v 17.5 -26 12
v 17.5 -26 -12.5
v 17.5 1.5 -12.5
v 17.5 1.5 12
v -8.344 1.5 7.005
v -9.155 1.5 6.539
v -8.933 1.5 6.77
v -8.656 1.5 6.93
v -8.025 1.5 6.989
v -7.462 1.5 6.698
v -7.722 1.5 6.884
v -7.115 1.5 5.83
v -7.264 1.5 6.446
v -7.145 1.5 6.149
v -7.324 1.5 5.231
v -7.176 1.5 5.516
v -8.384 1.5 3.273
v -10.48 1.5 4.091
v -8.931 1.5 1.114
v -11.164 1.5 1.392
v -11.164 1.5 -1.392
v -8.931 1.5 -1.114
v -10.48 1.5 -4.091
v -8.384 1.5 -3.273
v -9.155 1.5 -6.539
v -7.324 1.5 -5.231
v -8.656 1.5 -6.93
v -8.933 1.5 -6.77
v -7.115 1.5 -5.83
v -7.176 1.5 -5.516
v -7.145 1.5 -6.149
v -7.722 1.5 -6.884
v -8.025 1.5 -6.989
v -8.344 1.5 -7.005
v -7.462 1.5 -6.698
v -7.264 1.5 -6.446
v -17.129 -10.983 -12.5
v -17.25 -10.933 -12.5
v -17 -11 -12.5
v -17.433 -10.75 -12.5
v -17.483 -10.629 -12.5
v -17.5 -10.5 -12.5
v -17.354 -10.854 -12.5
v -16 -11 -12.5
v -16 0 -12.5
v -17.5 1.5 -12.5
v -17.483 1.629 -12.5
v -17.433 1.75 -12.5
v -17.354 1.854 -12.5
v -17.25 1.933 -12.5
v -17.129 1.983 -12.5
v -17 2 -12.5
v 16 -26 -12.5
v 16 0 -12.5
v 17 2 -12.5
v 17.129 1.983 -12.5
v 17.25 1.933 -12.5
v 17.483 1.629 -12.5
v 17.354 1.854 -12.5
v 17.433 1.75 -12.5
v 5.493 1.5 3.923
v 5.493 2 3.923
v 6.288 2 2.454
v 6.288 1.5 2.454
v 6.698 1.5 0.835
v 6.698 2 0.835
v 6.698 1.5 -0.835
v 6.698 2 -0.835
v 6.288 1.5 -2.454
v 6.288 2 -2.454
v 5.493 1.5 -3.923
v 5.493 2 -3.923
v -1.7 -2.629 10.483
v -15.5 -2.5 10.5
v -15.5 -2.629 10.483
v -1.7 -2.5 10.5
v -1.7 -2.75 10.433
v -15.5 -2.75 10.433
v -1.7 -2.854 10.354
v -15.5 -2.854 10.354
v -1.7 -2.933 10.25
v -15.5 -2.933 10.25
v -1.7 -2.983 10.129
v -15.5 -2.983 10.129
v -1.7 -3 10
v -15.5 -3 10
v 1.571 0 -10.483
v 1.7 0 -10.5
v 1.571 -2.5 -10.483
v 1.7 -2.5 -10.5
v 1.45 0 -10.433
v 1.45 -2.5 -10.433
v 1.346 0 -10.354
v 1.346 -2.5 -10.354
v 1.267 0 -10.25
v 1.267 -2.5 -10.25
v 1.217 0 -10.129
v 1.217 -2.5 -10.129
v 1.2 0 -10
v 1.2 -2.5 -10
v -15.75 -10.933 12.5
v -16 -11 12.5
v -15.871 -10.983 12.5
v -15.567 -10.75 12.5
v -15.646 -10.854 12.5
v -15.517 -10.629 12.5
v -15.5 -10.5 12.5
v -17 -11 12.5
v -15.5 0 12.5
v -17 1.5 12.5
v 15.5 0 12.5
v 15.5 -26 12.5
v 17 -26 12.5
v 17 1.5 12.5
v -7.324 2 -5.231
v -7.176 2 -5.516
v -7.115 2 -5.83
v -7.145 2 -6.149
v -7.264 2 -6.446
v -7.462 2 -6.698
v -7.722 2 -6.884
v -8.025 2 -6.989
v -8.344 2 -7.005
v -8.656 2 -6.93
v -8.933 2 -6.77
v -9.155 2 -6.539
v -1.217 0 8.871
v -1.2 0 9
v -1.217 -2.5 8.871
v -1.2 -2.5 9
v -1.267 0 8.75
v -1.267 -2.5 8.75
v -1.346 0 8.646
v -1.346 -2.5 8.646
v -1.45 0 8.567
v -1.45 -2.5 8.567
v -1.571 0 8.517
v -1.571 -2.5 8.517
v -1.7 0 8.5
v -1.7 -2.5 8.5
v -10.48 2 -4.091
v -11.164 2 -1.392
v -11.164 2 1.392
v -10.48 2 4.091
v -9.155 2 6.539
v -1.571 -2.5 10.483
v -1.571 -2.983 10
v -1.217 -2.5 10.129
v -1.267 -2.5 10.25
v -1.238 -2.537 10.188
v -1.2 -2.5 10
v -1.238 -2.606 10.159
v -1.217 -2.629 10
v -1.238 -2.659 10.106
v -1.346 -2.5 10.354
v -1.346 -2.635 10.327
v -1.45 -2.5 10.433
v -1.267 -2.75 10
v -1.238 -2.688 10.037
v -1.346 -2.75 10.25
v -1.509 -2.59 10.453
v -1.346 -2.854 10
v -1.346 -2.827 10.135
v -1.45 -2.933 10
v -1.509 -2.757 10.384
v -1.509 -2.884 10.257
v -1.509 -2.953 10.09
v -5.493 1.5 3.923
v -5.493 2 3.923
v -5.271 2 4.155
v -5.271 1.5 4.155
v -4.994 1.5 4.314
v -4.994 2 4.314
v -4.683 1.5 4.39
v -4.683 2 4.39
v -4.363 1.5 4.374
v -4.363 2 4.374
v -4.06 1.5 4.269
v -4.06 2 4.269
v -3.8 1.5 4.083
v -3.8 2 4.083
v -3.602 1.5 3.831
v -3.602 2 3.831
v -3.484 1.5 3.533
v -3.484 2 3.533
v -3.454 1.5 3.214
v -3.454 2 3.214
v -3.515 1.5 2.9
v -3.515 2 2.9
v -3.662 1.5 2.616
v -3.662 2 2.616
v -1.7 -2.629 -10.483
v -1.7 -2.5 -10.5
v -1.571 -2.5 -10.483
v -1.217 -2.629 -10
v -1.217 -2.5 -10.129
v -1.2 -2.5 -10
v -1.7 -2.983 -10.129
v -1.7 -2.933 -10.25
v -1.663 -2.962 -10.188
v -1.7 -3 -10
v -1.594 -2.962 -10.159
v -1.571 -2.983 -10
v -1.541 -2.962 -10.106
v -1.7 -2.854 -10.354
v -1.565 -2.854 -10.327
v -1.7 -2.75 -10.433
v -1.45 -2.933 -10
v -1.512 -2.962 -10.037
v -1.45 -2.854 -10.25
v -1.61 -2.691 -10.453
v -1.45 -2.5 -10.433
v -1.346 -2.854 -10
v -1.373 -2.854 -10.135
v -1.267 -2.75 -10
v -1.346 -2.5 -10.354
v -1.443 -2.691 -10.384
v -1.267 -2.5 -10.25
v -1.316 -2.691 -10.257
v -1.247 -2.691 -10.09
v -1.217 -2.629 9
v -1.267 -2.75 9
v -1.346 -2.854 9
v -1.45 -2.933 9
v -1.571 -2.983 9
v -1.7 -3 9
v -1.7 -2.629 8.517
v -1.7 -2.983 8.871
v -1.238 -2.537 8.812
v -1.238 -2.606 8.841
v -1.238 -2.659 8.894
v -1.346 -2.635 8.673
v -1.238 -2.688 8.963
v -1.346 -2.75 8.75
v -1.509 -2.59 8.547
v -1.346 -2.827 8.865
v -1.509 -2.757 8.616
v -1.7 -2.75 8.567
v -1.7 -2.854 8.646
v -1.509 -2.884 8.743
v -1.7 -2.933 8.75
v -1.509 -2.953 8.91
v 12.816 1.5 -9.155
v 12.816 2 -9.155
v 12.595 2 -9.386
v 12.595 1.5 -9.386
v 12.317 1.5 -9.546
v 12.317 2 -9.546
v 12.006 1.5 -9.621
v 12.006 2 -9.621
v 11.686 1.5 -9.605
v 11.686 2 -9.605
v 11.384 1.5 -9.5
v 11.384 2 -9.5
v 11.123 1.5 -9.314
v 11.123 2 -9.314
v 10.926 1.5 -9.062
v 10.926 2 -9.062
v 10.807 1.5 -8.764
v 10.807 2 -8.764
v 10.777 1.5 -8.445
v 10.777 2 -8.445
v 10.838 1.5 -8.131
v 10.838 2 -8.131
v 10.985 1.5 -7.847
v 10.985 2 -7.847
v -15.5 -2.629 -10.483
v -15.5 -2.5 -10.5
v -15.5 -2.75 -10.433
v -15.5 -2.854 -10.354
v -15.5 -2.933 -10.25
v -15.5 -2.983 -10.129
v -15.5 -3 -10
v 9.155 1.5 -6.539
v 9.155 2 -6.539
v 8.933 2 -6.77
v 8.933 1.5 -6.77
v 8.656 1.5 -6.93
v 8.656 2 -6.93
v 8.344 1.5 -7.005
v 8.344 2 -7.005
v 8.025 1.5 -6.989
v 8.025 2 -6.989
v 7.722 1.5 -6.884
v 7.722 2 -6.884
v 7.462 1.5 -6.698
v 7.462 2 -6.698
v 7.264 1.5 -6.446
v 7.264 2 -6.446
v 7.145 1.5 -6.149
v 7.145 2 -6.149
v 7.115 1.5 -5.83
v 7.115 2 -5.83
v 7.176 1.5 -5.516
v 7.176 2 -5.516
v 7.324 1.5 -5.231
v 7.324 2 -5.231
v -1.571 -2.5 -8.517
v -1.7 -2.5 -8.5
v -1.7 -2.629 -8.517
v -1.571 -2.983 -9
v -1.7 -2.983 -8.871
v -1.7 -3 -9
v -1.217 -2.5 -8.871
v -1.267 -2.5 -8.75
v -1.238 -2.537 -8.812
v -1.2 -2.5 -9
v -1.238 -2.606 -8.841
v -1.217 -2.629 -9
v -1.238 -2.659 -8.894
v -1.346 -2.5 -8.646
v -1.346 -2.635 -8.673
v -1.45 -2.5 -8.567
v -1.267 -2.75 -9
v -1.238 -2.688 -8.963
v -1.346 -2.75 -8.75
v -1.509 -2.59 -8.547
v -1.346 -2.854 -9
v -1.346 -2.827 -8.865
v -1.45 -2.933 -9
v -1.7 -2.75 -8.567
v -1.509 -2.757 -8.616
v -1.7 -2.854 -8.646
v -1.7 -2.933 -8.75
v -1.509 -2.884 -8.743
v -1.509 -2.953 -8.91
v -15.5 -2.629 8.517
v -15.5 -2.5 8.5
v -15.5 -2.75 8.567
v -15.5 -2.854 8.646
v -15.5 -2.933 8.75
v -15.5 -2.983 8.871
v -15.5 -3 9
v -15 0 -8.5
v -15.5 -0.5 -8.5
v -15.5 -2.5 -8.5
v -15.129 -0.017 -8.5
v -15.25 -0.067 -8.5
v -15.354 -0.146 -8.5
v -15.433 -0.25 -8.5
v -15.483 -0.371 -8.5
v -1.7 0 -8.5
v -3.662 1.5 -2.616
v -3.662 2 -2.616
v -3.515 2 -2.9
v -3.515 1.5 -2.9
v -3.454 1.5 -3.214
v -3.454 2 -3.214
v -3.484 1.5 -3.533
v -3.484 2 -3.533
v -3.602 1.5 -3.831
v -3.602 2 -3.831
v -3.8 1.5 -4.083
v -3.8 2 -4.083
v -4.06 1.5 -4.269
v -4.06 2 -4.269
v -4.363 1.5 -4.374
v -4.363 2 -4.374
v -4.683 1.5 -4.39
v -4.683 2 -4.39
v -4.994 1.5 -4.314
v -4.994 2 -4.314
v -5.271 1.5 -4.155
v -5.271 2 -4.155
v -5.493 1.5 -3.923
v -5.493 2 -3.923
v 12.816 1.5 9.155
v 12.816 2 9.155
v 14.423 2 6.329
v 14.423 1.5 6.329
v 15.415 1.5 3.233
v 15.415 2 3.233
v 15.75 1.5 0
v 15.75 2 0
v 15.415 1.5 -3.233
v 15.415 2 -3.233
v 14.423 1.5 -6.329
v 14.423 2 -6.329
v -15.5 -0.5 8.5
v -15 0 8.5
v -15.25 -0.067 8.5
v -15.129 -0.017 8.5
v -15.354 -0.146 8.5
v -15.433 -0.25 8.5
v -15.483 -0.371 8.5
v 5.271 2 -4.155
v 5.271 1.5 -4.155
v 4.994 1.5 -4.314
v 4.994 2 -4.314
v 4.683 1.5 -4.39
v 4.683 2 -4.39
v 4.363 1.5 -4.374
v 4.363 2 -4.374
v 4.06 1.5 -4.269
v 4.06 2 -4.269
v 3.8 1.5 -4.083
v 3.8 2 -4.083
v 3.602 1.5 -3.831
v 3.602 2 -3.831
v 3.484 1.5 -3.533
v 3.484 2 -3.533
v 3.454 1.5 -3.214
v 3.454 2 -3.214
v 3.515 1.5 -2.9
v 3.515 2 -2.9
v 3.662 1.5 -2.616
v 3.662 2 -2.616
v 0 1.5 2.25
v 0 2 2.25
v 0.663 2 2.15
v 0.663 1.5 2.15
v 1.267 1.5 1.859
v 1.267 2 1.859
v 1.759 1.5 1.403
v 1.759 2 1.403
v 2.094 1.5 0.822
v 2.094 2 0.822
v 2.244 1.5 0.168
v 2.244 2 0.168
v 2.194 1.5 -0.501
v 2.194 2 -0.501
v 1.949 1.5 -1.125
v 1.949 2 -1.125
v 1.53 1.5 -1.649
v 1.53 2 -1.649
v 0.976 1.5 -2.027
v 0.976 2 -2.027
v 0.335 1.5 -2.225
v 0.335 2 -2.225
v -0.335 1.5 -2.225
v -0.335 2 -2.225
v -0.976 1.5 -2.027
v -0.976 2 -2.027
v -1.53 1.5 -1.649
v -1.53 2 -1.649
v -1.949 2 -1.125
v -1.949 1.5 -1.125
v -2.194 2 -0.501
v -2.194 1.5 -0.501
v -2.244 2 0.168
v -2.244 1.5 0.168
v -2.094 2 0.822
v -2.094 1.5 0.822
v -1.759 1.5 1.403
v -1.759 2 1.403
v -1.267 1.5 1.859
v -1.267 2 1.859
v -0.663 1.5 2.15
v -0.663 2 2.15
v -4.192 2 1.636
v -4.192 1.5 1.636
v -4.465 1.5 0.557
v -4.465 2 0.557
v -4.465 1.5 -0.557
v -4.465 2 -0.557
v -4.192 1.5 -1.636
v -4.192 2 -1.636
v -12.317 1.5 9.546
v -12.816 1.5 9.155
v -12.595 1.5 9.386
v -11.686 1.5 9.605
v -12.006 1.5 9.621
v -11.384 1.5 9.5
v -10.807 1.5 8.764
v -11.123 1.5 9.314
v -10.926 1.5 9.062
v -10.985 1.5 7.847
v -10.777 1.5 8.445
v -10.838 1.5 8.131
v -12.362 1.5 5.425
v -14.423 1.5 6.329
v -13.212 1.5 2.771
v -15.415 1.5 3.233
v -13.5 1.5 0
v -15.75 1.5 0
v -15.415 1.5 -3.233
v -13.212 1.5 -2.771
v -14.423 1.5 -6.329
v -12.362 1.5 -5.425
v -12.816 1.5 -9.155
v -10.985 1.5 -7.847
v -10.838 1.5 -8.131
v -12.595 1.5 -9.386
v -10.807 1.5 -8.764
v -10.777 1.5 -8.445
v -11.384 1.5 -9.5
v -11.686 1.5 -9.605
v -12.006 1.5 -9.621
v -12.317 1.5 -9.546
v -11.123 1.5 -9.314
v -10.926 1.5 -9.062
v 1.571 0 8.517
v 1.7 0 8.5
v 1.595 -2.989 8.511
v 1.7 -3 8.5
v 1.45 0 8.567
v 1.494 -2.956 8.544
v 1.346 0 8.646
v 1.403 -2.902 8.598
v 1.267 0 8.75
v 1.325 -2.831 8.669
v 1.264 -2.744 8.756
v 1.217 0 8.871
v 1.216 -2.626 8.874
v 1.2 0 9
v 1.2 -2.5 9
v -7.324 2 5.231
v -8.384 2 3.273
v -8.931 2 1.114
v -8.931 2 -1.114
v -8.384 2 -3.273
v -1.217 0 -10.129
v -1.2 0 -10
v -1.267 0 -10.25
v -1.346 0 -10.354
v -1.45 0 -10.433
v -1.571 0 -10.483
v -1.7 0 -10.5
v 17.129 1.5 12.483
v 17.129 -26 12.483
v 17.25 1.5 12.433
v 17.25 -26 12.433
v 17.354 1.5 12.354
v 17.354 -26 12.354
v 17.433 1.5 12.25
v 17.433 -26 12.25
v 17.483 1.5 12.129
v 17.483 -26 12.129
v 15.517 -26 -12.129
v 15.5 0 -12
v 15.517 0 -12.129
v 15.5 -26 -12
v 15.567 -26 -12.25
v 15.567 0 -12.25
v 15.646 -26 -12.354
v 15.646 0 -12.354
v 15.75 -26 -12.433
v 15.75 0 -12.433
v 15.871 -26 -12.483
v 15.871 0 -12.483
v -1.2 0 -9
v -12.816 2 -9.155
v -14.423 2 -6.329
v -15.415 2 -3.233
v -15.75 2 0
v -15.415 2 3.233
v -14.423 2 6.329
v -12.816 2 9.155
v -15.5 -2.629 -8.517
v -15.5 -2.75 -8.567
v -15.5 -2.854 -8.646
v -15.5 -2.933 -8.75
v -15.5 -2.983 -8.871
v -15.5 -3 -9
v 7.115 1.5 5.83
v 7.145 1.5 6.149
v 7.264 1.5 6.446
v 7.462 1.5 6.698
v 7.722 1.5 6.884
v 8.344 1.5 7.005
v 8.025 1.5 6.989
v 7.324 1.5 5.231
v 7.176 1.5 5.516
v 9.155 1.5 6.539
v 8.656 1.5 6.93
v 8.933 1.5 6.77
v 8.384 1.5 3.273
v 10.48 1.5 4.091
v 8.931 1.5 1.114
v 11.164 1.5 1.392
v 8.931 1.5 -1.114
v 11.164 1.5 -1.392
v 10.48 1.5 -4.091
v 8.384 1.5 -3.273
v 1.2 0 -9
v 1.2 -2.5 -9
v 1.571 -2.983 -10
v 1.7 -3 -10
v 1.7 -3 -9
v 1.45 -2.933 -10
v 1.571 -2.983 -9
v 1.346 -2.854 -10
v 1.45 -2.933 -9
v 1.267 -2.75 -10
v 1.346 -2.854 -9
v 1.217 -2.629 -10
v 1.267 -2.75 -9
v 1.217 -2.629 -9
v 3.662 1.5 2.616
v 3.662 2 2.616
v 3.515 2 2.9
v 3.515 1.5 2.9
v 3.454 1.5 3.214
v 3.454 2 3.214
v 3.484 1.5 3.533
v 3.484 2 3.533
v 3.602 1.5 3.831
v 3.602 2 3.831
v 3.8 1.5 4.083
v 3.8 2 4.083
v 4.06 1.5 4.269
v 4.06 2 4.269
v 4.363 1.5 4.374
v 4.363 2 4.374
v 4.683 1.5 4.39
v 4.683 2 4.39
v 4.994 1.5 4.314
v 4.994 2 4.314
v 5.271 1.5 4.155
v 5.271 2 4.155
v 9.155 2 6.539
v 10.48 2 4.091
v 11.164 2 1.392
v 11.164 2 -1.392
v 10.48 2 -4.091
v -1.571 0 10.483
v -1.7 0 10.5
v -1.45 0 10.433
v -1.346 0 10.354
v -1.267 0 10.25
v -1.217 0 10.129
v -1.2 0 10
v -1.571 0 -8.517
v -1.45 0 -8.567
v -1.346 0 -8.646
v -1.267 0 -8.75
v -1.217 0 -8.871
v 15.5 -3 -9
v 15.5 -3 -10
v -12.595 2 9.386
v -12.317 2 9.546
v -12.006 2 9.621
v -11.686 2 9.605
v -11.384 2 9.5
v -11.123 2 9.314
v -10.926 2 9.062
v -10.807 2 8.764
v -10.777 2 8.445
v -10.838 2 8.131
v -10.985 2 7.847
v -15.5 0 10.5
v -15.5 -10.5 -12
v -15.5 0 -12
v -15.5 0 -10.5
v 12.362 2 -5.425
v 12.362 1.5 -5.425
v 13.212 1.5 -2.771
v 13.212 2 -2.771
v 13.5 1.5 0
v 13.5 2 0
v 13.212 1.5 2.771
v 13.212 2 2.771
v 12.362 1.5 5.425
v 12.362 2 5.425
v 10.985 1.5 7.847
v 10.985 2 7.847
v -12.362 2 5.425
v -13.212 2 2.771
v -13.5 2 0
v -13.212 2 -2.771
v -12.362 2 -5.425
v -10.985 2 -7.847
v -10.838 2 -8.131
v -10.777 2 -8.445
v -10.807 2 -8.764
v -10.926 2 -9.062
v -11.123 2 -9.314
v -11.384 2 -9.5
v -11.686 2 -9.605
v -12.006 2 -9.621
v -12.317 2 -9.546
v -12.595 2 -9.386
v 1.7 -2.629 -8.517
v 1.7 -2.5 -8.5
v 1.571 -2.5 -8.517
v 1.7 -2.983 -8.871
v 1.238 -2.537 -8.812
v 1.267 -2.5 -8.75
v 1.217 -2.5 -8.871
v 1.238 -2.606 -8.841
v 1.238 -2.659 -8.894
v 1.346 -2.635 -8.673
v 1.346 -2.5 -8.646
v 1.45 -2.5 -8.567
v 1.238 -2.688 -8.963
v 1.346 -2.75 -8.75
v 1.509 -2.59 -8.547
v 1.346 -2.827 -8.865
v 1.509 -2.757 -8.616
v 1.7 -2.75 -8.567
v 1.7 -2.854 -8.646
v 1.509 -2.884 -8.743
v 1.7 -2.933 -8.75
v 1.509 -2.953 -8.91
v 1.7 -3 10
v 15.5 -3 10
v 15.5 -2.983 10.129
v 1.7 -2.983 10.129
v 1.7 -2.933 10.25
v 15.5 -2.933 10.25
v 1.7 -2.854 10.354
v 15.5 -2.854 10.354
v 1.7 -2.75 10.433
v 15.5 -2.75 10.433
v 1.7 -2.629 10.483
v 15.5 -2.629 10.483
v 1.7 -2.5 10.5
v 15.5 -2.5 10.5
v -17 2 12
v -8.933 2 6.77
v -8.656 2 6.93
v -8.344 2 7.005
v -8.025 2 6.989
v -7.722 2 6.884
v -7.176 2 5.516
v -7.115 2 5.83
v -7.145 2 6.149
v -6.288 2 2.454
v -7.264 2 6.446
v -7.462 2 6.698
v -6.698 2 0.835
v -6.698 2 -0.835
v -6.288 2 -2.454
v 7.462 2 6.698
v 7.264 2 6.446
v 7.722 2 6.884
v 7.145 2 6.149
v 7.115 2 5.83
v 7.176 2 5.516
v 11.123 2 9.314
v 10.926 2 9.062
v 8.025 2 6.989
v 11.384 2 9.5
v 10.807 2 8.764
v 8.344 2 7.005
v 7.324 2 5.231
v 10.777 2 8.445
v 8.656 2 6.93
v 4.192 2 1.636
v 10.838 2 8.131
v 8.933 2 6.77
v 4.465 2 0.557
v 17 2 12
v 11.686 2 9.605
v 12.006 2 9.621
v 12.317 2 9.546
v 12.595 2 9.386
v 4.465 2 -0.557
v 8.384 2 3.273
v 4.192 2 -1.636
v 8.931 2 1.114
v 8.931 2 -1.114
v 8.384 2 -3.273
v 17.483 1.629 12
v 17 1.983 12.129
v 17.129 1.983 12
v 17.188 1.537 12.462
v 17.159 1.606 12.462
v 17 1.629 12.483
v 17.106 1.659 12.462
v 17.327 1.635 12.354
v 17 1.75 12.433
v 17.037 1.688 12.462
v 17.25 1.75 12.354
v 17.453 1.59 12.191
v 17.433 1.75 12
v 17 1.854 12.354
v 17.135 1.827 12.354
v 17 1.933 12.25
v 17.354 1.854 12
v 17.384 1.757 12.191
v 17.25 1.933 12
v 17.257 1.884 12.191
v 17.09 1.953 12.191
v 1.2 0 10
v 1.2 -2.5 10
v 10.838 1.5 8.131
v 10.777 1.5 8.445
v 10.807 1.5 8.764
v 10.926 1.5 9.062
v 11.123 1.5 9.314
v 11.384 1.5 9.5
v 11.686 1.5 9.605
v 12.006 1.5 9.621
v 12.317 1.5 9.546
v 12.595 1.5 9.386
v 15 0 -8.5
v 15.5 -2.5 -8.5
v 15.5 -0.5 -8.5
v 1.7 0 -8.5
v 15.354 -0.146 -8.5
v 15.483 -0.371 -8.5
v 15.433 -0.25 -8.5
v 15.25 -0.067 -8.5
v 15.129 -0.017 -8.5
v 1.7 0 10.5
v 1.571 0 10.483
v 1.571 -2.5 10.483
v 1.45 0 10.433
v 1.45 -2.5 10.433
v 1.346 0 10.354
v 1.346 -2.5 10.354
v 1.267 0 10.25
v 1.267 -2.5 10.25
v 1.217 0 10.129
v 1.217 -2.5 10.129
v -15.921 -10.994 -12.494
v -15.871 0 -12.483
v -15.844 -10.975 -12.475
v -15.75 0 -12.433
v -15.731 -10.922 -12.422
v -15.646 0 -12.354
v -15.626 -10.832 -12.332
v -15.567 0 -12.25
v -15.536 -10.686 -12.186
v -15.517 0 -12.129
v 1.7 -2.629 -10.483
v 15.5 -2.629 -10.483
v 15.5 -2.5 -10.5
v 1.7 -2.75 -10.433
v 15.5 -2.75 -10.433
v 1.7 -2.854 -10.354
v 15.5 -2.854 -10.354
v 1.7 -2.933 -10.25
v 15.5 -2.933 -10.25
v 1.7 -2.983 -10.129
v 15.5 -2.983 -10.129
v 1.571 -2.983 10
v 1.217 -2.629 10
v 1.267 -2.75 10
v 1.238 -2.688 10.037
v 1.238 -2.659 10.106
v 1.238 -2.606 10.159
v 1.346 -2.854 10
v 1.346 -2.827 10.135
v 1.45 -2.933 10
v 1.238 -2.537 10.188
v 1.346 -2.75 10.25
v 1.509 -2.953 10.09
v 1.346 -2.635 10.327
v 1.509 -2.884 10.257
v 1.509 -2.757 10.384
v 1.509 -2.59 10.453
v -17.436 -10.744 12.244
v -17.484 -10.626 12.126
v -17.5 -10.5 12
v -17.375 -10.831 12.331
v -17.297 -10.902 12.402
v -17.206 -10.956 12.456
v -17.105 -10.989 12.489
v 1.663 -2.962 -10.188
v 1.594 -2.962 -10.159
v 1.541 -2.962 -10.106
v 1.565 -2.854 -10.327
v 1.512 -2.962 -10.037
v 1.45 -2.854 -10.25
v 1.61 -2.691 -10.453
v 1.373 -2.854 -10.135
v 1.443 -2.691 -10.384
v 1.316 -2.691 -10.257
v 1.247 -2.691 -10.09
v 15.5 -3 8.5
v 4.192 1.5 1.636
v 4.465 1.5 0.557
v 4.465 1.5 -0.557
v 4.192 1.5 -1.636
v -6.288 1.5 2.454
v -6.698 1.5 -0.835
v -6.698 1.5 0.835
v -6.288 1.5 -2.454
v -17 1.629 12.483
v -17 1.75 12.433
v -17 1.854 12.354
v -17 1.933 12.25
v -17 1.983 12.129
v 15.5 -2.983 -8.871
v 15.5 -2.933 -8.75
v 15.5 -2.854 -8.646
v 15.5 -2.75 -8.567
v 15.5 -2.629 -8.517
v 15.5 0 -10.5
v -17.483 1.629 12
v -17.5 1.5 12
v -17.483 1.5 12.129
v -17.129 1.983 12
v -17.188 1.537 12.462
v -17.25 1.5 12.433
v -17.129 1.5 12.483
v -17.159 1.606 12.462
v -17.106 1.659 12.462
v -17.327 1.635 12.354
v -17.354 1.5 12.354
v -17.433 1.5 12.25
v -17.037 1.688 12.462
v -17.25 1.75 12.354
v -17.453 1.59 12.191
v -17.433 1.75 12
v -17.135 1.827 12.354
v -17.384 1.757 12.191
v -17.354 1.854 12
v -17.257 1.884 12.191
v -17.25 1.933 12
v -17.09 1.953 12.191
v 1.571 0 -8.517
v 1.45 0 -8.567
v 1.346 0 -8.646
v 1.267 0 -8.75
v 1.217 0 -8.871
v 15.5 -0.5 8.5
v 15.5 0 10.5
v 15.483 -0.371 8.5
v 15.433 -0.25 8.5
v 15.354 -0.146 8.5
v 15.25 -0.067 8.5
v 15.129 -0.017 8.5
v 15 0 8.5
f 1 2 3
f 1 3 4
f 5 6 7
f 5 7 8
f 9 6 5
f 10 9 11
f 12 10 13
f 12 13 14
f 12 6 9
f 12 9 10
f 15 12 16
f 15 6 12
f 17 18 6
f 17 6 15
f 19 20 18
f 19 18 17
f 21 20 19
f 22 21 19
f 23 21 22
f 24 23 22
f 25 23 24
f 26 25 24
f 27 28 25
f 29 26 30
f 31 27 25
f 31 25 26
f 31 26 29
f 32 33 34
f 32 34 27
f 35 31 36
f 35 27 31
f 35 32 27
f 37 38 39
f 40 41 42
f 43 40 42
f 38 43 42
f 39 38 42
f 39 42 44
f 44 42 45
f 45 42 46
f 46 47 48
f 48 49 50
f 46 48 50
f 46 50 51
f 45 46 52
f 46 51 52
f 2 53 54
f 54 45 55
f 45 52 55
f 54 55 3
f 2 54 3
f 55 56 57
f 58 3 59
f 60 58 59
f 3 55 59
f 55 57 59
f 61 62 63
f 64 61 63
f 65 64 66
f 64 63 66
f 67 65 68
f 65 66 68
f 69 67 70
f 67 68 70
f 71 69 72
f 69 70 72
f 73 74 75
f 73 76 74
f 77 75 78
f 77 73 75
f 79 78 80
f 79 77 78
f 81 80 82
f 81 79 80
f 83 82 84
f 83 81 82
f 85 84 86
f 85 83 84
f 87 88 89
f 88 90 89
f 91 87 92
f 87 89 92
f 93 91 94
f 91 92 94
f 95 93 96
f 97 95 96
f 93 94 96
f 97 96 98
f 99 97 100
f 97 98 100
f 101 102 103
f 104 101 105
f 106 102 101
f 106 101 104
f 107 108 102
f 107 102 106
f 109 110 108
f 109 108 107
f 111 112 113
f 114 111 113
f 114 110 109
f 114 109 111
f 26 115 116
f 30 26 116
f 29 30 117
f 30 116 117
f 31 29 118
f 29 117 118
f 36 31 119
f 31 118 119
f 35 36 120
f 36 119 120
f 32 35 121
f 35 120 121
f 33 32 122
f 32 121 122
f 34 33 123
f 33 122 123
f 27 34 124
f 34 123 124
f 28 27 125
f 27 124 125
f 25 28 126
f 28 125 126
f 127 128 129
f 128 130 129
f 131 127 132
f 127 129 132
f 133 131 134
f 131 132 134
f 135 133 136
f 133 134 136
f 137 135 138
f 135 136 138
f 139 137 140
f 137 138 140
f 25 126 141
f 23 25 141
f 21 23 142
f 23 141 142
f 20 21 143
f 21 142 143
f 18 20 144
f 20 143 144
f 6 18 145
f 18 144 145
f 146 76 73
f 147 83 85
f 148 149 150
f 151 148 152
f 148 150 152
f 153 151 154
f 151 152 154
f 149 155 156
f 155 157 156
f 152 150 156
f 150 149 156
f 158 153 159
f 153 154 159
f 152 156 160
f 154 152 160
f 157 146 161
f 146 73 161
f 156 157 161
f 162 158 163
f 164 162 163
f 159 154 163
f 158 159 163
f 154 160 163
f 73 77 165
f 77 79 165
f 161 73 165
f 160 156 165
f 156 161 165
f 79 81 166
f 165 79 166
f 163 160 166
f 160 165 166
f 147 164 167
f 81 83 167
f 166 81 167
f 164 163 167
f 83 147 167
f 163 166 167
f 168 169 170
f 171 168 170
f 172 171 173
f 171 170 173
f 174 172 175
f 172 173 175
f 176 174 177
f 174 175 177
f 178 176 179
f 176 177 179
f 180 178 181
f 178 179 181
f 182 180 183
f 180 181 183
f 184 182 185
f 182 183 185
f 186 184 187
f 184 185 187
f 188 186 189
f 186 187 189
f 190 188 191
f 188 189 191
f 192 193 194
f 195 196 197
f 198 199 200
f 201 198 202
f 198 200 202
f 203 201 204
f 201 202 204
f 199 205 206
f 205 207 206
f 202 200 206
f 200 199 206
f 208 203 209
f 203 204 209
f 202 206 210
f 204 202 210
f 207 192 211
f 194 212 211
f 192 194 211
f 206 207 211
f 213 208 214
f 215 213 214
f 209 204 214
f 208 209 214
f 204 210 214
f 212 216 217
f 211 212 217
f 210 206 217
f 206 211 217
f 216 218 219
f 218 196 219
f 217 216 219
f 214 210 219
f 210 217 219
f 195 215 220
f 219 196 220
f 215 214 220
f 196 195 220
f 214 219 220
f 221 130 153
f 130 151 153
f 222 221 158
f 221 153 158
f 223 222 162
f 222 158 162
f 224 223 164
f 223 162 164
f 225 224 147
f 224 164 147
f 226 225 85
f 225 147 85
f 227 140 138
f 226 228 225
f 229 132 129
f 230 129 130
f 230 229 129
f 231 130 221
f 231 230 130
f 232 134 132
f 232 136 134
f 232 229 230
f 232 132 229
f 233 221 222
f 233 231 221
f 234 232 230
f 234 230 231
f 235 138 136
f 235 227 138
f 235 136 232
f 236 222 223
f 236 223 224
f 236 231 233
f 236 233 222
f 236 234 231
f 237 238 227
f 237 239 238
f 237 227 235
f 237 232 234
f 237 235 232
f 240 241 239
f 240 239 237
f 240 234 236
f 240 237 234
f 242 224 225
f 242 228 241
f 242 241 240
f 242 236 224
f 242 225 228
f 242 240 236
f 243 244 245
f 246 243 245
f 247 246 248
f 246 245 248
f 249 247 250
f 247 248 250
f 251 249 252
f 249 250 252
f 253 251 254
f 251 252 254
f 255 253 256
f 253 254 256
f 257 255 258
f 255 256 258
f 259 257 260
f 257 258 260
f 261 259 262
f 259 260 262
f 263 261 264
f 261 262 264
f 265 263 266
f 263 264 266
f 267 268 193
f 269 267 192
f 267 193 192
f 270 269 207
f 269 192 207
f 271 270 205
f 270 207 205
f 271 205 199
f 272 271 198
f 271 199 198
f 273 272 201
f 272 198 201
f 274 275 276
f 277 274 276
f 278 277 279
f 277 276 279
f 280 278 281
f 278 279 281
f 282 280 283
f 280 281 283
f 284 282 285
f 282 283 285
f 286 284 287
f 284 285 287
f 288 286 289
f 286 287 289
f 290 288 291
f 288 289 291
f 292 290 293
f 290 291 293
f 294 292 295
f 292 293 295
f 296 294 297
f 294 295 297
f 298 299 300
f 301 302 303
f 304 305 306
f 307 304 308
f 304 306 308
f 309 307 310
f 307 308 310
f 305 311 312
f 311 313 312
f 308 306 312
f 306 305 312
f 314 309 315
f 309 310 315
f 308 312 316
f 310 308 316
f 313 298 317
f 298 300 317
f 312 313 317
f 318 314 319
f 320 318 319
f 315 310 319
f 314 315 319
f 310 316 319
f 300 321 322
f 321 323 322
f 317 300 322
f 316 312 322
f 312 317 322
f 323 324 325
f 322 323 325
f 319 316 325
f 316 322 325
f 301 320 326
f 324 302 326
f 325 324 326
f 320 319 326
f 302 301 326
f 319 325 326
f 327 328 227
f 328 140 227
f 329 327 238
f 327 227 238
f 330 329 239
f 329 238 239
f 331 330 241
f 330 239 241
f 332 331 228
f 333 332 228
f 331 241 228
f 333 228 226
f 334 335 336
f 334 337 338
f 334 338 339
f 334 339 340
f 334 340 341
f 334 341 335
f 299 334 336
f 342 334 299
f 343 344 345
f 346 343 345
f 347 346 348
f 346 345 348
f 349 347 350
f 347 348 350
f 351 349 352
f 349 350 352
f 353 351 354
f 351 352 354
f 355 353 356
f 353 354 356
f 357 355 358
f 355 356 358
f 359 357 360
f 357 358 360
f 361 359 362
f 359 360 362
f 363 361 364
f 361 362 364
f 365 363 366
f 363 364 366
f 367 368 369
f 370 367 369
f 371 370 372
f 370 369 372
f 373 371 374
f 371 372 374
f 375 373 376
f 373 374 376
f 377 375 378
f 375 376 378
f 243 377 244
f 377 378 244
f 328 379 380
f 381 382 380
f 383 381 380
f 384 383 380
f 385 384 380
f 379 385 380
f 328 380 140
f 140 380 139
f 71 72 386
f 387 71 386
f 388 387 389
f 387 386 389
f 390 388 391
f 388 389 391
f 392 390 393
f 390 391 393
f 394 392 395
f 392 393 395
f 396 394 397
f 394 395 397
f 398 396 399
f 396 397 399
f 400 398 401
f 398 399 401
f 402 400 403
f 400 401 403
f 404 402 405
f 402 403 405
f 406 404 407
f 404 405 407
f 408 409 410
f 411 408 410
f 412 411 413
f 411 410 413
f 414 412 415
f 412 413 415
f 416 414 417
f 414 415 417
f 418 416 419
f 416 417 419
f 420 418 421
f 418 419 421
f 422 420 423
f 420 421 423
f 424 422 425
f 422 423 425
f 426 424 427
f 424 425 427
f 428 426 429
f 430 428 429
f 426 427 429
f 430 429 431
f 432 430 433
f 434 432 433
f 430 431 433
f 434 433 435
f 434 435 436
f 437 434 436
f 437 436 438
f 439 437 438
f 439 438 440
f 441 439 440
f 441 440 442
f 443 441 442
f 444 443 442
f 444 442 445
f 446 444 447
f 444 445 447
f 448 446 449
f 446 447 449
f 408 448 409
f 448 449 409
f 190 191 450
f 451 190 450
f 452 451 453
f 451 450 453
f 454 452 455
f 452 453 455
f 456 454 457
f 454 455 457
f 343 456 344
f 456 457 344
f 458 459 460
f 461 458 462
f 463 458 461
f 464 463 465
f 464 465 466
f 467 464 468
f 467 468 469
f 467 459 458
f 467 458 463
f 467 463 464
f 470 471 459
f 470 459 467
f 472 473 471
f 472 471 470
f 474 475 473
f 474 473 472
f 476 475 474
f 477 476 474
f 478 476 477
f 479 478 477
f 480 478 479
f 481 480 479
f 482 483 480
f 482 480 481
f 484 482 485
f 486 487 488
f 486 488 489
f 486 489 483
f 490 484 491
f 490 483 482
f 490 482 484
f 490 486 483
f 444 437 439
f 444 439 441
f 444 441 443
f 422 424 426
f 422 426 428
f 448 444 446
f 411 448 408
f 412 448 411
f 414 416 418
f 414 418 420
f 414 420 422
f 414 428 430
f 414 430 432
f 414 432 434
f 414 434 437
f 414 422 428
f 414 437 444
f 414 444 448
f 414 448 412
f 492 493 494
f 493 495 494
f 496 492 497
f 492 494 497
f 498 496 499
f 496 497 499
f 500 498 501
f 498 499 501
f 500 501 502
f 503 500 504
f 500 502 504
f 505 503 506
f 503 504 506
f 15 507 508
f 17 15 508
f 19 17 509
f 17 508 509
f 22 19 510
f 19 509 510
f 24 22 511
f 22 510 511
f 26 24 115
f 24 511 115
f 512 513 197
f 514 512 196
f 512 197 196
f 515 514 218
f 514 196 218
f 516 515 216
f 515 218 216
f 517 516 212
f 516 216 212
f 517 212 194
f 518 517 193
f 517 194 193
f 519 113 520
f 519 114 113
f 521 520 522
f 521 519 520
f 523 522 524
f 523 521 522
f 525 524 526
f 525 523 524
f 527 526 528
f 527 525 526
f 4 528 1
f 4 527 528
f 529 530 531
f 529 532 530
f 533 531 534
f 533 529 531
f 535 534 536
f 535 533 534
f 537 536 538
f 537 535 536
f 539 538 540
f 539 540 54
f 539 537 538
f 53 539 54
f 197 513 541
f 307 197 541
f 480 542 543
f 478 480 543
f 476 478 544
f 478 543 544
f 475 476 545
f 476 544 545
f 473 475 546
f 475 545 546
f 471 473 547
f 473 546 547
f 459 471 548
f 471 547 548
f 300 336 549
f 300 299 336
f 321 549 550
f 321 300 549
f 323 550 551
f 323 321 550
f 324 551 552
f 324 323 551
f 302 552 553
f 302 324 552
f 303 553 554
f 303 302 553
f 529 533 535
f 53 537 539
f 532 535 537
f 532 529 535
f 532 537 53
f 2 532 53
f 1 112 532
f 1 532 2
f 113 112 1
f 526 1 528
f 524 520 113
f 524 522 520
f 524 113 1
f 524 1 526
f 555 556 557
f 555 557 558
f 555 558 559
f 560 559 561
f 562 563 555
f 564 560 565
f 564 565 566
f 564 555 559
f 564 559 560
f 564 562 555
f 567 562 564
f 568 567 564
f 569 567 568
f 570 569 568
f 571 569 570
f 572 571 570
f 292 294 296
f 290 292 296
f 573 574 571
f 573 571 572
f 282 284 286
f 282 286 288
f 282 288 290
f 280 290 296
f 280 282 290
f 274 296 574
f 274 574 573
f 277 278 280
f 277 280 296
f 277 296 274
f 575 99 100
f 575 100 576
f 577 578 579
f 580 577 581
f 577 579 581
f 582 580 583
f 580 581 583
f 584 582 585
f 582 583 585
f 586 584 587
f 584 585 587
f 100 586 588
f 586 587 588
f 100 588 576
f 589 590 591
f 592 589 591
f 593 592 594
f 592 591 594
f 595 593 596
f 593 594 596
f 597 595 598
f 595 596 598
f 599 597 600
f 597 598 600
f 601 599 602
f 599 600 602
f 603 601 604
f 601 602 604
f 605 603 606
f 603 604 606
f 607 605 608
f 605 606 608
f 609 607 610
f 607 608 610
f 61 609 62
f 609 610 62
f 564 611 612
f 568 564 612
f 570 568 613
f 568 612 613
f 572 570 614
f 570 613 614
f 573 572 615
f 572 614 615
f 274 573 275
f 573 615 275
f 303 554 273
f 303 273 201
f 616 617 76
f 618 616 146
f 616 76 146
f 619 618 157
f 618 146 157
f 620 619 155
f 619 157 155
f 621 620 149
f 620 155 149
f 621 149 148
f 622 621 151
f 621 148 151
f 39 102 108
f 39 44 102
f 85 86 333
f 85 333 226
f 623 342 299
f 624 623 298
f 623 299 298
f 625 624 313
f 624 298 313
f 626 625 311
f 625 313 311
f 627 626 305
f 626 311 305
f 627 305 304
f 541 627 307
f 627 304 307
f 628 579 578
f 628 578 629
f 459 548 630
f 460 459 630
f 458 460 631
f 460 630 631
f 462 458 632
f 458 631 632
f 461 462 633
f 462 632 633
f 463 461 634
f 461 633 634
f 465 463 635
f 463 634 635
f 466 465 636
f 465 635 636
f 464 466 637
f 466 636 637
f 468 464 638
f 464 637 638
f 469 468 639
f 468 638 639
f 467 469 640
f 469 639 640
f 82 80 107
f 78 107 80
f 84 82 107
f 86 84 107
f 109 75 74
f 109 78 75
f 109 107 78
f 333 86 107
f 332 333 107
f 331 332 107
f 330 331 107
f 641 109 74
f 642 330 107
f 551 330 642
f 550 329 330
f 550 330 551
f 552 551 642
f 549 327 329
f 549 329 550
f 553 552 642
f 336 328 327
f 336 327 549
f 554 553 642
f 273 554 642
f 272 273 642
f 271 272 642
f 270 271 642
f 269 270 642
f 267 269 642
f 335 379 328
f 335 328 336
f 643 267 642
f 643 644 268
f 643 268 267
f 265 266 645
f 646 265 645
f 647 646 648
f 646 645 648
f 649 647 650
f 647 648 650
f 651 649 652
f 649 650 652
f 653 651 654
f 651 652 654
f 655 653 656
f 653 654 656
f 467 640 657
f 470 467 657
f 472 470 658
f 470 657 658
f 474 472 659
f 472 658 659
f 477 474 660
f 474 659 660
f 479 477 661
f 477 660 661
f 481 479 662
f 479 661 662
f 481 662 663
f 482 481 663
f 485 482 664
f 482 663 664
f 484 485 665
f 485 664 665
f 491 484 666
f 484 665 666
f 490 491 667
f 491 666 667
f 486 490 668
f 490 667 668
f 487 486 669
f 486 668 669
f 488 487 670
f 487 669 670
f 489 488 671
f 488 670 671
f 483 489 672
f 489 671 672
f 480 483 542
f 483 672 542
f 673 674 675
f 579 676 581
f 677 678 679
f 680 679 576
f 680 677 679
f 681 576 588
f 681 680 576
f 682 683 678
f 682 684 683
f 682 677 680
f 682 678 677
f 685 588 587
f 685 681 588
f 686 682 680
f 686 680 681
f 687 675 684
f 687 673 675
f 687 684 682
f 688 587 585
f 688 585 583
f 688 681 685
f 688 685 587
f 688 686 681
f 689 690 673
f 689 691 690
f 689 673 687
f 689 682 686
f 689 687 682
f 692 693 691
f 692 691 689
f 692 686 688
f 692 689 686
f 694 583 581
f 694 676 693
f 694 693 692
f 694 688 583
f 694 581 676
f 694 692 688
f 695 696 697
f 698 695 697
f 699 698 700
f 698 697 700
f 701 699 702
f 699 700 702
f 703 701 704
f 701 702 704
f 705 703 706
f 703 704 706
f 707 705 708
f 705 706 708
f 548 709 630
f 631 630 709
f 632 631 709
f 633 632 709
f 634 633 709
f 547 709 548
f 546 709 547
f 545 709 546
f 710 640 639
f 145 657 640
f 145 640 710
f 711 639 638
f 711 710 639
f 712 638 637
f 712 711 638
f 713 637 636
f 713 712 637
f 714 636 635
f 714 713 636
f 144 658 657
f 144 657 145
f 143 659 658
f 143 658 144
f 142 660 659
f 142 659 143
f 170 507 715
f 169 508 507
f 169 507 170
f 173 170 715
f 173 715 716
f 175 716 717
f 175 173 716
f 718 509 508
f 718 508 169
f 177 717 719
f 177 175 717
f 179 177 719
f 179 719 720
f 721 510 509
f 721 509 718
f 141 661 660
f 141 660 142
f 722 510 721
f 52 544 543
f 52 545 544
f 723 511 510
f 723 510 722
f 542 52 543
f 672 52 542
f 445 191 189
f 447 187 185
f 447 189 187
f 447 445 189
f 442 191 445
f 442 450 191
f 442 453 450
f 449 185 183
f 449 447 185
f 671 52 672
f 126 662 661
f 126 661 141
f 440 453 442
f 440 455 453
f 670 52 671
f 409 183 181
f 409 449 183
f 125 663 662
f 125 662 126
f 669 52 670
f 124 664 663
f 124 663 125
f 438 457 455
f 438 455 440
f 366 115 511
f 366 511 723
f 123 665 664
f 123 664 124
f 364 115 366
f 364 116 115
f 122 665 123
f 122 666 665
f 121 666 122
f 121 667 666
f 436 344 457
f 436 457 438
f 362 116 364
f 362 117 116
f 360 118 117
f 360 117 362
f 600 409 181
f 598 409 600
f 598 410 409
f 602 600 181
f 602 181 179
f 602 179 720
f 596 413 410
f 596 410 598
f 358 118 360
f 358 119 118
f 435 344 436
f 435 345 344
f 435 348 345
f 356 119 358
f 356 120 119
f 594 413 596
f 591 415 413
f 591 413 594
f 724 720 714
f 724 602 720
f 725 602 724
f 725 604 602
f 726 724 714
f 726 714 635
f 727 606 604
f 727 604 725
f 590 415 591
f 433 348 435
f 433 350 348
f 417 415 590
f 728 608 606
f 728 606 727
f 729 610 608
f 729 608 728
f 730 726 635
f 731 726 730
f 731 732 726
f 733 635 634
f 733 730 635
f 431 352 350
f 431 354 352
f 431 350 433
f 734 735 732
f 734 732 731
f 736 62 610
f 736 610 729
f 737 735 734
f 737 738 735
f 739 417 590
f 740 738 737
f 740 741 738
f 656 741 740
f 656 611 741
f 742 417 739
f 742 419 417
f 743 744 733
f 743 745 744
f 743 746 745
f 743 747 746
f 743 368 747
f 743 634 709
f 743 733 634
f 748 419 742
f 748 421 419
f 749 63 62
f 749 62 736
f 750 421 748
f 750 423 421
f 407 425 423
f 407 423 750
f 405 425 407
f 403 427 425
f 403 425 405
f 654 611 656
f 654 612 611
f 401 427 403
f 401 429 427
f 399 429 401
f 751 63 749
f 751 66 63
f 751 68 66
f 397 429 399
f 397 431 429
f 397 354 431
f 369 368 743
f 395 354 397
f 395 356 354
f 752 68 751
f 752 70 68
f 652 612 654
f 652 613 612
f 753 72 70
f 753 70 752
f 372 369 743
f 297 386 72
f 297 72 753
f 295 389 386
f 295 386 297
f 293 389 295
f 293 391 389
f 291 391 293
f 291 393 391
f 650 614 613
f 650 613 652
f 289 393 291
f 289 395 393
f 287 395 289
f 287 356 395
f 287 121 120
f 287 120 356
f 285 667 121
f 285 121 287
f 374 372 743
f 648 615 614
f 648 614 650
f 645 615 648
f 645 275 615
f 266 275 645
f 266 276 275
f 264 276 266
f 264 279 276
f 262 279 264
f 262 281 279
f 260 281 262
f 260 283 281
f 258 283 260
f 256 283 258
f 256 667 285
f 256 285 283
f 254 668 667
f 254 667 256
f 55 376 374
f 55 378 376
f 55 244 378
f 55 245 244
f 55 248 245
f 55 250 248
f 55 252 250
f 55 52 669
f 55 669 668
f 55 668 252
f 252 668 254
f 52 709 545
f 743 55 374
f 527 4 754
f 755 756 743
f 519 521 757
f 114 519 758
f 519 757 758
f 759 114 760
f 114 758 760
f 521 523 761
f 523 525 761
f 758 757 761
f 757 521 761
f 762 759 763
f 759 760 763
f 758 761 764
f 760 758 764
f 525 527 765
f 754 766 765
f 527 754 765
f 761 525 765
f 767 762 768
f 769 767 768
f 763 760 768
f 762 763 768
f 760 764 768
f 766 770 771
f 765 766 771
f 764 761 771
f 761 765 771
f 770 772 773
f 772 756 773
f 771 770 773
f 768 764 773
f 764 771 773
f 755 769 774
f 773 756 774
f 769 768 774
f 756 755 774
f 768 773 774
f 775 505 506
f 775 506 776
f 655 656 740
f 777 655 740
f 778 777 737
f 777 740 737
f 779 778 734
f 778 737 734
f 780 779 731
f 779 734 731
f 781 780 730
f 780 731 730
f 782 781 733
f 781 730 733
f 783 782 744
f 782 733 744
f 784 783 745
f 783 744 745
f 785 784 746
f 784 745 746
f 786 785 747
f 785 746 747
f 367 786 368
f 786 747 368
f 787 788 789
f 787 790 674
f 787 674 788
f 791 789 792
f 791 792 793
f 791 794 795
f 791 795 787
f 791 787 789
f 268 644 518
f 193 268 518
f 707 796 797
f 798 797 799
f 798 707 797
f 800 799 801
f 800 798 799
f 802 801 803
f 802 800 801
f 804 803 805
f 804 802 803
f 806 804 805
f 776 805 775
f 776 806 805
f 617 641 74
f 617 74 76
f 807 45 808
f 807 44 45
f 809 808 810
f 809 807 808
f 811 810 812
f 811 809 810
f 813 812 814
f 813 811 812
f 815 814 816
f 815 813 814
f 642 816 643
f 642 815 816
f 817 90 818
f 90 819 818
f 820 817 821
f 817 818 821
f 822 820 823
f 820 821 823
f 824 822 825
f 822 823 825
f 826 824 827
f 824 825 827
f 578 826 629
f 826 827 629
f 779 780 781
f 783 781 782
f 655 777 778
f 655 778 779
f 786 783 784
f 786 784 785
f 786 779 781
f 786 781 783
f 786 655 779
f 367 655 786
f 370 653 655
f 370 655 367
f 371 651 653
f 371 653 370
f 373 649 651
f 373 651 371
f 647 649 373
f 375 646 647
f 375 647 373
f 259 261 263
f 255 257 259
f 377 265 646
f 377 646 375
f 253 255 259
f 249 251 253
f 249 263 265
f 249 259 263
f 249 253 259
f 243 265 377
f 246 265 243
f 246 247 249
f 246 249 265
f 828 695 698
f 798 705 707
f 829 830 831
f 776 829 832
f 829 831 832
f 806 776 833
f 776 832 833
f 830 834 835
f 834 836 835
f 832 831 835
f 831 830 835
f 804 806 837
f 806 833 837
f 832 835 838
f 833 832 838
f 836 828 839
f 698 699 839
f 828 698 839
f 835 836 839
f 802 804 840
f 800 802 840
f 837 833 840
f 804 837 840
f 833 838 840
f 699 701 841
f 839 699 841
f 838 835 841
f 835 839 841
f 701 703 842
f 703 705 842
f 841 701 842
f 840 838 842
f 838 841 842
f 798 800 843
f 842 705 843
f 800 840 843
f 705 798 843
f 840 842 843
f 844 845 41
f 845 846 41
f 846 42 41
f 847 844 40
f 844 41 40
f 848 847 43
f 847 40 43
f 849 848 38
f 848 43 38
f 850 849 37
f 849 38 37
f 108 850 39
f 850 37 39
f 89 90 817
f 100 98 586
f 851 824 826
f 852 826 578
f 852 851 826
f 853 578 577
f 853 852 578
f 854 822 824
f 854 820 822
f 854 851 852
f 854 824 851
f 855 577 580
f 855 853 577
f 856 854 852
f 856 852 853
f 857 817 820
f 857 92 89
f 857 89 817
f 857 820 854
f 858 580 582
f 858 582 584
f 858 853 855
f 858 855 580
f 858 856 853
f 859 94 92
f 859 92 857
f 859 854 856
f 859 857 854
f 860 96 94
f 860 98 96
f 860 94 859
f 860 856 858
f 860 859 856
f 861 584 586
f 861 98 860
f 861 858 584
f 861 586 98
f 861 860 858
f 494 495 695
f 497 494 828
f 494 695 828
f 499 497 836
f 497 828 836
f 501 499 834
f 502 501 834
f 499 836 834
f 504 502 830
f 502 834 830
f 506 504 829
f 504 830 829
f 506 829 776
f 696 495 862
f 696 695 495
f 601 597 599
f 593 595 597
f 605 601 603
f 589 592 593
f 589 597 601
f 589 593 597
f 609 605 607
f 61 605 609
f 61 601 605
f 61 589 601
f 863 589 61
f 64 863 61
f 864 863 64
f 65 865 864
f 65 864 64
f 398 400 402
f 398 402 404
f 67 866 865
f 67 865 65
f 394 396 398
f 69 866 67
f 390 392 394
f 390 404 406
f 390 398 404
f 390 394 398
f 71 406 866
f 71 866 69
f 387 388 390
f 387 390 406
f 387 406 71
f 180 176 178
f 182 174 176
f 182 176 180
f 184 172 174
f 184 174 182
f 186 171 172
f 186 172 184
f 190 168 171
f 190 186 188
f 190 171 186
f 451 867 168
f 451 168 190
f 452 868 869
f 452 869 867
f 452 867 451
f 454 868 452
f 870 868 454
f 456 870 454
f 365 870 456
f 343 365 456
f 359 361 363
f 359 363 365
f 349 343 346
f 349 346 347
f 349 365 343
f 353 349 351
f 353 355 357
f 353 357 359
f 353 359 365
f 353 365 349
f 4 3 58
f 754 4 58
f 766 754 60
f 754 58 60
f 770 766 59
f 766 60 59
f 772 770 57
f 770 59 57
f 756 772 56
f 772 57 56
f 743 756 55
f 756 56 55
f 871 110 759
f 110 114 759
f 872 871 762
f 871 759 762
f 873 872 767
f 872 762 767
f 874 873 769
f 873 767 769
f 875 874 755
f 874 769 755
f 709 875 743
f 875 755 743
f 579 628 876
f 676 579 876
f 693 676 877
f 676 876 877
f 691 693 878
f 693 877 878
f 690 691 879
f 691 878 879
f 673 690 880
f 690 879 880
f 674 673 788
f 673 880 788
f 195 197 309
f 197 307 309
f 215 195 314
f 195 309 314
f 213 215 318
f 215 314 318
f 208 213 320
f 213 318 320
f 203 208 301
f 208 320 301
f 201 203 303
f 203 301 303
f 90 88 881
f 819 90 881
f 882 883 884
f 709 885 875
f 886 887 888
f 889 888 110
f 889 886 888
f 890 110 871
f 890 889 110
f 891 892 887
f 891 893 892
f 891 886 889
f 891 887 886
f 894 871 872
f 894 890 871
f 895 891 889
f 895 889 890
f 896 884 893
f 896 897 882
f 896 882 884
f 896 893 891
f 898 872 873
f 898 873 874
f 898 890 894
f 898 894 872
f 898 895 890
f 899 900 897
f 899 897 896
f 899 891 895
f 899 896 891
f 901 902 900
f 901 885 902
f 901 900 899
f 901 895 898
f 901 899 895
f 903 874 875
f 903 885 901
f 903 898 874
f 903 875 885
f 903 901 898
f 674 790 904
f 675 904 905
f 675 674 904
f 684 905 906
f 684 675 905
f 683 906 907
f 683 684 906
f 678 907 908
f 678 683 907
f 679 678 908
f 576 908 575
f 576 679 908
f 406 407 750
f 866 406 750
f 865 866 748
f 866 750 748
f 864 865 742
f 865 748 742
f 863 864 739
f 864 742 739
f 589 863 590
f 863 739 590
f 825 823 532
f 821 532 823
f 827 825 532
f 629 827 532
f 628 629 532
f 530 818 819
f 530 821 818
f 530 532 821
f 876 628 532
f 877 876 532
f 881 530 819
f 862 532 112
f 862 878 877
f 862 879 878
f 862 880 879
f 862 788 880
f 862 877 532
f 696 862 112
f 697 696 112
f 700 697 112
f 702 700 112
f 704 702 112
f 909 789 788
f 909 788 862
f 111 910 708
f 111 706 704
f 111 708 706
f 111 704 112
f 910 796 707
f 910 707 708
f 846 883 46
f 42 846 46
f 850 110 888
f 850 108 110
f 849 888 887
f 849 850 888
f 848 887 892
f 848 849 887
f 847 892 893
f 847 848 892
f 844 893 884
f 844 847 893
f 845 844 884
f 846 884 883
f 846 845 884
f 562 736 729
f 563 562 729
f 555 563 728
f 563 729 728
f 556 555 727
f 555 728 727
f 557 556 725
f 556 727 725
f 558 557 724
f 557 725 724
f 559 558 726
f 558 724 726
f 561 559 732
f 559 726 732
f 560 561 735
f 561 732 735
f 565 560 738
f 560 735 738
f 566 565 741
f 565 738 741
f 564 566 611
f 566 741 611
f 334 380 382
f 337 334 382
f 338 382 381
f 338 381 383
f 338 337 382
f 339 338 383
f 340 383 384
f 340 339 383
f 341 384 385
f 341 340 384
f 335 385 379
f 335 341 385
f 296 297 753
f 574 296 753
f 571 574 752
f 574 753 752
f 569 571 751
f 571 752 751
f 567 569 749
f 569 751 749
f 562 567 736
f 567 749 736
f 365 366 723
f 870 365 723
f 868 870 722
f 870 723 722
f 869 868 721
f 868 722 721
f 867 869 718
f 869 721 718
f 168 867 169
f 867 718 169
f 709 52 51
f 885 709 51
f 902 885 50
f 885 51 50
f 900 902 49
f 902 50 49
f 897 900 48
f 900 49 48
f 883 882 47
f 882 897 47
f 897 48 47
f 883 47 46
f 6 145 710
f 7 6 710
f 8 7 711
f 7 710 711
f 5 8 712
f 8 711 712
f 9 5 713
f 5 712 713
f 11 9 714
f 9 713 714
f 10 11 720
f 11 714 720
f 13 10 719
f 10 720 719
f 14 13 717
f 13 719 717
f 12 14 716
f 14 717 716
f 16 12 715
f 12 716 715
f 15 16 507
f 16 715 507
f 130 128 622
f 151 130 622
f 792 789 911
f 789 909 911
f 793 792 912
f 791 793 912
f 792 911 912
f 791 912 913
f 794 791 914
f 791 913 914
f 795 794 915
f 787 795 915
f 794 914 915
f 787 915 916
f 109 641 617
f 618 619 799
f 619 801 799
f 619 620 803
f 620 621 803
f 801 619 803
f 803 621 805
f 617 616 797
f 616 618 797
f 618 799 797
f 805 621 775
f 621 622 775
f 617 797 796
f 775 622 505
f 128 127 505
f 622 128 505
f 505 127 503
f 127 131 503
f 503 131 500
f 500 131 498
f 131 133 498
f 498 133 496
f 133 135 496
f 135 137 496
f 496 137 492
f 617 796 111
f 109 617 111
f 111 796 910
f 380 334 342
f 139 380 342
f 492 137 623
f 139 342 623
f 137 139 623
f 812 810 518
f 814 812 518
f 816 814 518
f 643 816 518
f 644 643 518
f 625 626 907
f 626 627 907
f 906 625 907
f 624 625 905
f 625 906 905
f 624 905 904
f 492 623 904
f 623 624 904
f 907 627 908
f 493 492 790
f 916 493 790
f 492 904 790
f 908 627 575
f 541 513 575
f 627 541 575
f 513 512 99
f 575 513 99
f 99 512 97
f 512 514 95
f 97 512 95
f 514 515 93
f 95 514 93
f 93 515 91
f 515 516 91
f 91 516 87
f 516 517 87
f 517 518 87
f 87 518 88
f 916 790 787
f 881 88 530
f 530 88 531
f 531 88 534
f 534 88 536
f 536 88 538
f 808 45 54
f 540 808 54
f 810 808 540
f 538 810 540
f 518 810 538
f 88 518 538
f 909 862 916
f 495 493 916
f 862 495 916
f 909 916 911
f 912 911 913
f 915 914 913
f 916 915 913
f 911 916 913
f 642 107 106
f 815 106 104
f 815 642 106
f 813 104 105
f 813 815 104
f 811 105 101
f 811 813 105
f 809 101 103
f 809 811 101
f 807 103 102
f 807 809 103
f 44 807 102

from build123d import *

# Parameters (mm, degrees)
SKETCH1_W           = 35
SKETCH1_H           = 25
BOSS_EXTRUDE1_DEPTH = 2
SKETCH3_W           = 2
SKETCH3_H           = 25
BOSS_EXTRUDE3_DEPTH = 11
SKETCH4_W           = 2
SKETCH4_H           = 25
BOSS_EXTRUDE4_DEPTH = 26
SKETCH5_W           = 14.3
SKETCH5_H           = 2
BOSS_EXTRUDE5_DEPTH = 3
SKETCH6_R           = 2.25
CUT_EXTRUDE1_DEPTH  = 0.5
FILLET1_R           = 0.5


with BuildPart() as part:
    # Sketch1 → Boss-Extrude1 (new body)
    with BuildSketch(Plane(origin=(0, 0, 0), x_dir=(1, 0, 0), z_dir=(0, 1, 0))):
        Rectangle(SKETCH1_W, SKETCH1_H)
    extrude(amount=BOSS_EXTRUDE1_DEPTH)

    # Sketch3 → Boss-Extrude3 (add)
    with BuildSketch(Plane(origin=(0, 0, 0), x_dir=(-1, 0, 0), z_dir=(0, -1, 0))):
        with Locations((16.5, 0)):
            Rectangle(SKETCH3_W, SKETCH3_H)
    extrude(amount=BOSS_EXTRUDE3_DEPTH)

    # Sketch4 → Boss-Extrude4 (add)
    with BuildSketch(Plane.XZ):
        with Locations((16.5, 0)):
            Rectangle(SKETCH4_W, SKETCH4_H)
    extrude(amount=BOSS_EXTRUDE4_DEPTH)

    # Sketch5 → Boss-Extrude5 (add)
    with BuildSketch(Plane.XZ):
        with Locations((8.35, 9.5)):
            Rectangle(SKETCH5_W, SKETCH5_H)
        with Locations((-8.35, 9.5)):
            Rectangle(SKETCH5_W, SKETCH5_H)
        with Locations((-8.35, -9.5)):
            Rectangle(SKETCH5_W, SKETCH5_H)
        with Locations((8.35, -9.5)):
            Rectangle(SKETCH5_W, SKETCH5_H)
    extrude(amount=BOSS_EXTRUDE5_DEPTH)

    # Sketch6 → Cut-Extrude1 (cut)
    with BuildSketch(Plane(origin=(0, 2, 0), x_dir=(1, 0, 0), z_dir=(0, 1, 0))):
        with Locations(Location((0, 0, 0), (0, 0, 270))):
            Circle(SKETCH6_R)
        with BuildLine():
            ThreePointArc((9.154501609, -6.538929598), (11.25, 1e-08), (9.154501598, 6.538929614))
            ThreePointArc((9.154501598, 6.538929614), (7.585158455, 6.800486886), (7.323601248, 5.231143733))
            ThreePointArc((7.323601248, 5.231143733), (9, -9e-09), (7.323601238, -5.231143747))
            ThreePointArc((7.323601238, -5.231143747), (7.58515847, -6.800486897), (9.154501609, -6.538929598))
        make_face()
        with BuildLine():
            ThreePointArc((-7.323601248, -5.231143733), (-9, -5e-09), (-7.323601254, 5.231143725))
            ThreePointArc((-7.323601254, 5.231143725), (-7.585158451, 6.800486883), (-9.154501598, 6.538929614))
            ThreePointArc((-9.154501598, 6.538929614), (-11.25, -1.2e-08), (-9.154501584, -6.538929633))
            ThreePointArc((-9.154501584, -6.538929633), (-7.585158446, -6.800486879), (-7.323601248, -5.231143733))
        make_face()
        with BuildLine():
            ThreePointArc((5.492700959, -3.923357768), (6.75, -1e-08), (5.492700971, 3.923357752))
            ThreePointArc((5.492700971, 3.923357752), (3.923357826, 4.184915008), (3.661800635, 2.615571852))
            ThreePointArc((3.661800635, 2.615571852), (4.5, -2.4e-08), (3.661800607, -2.61557189))
            ThreePointArc((3.661800607, -2.61557189), (3.923357837, -4.184915016), (5.492700959, -3.923357768))
        make_face()
        with BuildLine():
            ThreePointArc((-3.661800619, -2.615571874), (-4.5, 1.3e-08), (-3.661800604, 2.615571895))
            ThreePointArc((-3.661800604, 2.615571895), (-3.923357847, 4.184915023), (-5.492700971, 3.923357752))
            ThreePointArc((-5.492700971, 3.923357752), (-6.75, 0), (-5.492700971, -3.923357752))
            ThreePointArc((-5.492700971, -3.923357752), (-3.923357837, -4.184915016), (-3.661800619, -2.615571874))
        make_face()
        with BuildLine():
            ThreePointArc((10.985401866, 7.846715609), (13.5, 1.4e-08), (10.985401882, -7.846715586))
            ThreePointArc((10.985401882, -7.846715586), (11.246959012, -9.416058712), (12.81630214, -9.154501596))
            ThreePointArc((12.81630214, -9.154501596), (15.75, 2.5e-08), (12.816302111, 9.154501636))
            ThreePointArc((12.816302111, 9.154501636), (11.246959003, 9.416058706), (10.985401866, 7.846715609))
        make_face()
        with BuildLine():
            ThreePointArc((-10.985401876, -7.846715595), (-13.5, 4e-08), (-10.985401829, 7.84671566))
            ThreePointArc((-10.985401829, 7.84671566), (-11.246959061, 9.416058747), (-12.816302157, 9.154501571))
            ThreePointArc((-12.816302157, 9.154501571), (-15.75, 4.9e-08), (-12.816302215, -9.154501491))
            ThreePointArc((-12.816302215, -9.154501491), (-11.246959069, -9.416058753), (-10.985401876, -7.846715595))
        make_face()
    extrude(amount=-CUT_EXTRUDE1_DEPTH, mode=Mode.SUBTRACT)

    # Fillet1
    fillet1_edges = [part.edges().sort_by_distance(p)[0] for p in [
        (-17.5, 2, 0),
        (-17.5, -4.5, 12.5),
        (-17.5, -11, 0),
        (17.5, 2, 0),
        (17.5, -12, 12.5),
        (15.5, 0, 0),
        (-15.5, 0, 0),
        (8.35, -3, -8.5),
        (-8.35, -3, -8.5),
        (-8.35, -3, 8.5),
        (-8.35, -3, 10.5),
        (8.35, -3, 10.5),
        (-1.2, -1.5, 10.5),
        (-1.2, -1.5, 8.5),
        (1.2, -3, 9.5),
        (1.2, -1.5, 10.5),
        (1.2, -1.5, 8.5),
        (-1.2, -1.5, -10.5),
        (-1.2, -1.5, -8.5),
        (1.2, -1.5, -8.5),
        (1.2, -1.5, -10.5),
        (8.35, -3, -10.5),
        (-8.35, -3, -10.5),
        (0, 2, 12.5),
        (-15.5, -11, 0),
        (-1.2, -3, 9.5),
        (-1.2, -3, -9.5),
        (1.2, -3, -9.5),
        (15.5, -13, -12.5),
        (-15.5, -5.5, -12.5),
    ]]
    fillet(fillet1_edges, radius=FILLET1_R)


solid = part.part
